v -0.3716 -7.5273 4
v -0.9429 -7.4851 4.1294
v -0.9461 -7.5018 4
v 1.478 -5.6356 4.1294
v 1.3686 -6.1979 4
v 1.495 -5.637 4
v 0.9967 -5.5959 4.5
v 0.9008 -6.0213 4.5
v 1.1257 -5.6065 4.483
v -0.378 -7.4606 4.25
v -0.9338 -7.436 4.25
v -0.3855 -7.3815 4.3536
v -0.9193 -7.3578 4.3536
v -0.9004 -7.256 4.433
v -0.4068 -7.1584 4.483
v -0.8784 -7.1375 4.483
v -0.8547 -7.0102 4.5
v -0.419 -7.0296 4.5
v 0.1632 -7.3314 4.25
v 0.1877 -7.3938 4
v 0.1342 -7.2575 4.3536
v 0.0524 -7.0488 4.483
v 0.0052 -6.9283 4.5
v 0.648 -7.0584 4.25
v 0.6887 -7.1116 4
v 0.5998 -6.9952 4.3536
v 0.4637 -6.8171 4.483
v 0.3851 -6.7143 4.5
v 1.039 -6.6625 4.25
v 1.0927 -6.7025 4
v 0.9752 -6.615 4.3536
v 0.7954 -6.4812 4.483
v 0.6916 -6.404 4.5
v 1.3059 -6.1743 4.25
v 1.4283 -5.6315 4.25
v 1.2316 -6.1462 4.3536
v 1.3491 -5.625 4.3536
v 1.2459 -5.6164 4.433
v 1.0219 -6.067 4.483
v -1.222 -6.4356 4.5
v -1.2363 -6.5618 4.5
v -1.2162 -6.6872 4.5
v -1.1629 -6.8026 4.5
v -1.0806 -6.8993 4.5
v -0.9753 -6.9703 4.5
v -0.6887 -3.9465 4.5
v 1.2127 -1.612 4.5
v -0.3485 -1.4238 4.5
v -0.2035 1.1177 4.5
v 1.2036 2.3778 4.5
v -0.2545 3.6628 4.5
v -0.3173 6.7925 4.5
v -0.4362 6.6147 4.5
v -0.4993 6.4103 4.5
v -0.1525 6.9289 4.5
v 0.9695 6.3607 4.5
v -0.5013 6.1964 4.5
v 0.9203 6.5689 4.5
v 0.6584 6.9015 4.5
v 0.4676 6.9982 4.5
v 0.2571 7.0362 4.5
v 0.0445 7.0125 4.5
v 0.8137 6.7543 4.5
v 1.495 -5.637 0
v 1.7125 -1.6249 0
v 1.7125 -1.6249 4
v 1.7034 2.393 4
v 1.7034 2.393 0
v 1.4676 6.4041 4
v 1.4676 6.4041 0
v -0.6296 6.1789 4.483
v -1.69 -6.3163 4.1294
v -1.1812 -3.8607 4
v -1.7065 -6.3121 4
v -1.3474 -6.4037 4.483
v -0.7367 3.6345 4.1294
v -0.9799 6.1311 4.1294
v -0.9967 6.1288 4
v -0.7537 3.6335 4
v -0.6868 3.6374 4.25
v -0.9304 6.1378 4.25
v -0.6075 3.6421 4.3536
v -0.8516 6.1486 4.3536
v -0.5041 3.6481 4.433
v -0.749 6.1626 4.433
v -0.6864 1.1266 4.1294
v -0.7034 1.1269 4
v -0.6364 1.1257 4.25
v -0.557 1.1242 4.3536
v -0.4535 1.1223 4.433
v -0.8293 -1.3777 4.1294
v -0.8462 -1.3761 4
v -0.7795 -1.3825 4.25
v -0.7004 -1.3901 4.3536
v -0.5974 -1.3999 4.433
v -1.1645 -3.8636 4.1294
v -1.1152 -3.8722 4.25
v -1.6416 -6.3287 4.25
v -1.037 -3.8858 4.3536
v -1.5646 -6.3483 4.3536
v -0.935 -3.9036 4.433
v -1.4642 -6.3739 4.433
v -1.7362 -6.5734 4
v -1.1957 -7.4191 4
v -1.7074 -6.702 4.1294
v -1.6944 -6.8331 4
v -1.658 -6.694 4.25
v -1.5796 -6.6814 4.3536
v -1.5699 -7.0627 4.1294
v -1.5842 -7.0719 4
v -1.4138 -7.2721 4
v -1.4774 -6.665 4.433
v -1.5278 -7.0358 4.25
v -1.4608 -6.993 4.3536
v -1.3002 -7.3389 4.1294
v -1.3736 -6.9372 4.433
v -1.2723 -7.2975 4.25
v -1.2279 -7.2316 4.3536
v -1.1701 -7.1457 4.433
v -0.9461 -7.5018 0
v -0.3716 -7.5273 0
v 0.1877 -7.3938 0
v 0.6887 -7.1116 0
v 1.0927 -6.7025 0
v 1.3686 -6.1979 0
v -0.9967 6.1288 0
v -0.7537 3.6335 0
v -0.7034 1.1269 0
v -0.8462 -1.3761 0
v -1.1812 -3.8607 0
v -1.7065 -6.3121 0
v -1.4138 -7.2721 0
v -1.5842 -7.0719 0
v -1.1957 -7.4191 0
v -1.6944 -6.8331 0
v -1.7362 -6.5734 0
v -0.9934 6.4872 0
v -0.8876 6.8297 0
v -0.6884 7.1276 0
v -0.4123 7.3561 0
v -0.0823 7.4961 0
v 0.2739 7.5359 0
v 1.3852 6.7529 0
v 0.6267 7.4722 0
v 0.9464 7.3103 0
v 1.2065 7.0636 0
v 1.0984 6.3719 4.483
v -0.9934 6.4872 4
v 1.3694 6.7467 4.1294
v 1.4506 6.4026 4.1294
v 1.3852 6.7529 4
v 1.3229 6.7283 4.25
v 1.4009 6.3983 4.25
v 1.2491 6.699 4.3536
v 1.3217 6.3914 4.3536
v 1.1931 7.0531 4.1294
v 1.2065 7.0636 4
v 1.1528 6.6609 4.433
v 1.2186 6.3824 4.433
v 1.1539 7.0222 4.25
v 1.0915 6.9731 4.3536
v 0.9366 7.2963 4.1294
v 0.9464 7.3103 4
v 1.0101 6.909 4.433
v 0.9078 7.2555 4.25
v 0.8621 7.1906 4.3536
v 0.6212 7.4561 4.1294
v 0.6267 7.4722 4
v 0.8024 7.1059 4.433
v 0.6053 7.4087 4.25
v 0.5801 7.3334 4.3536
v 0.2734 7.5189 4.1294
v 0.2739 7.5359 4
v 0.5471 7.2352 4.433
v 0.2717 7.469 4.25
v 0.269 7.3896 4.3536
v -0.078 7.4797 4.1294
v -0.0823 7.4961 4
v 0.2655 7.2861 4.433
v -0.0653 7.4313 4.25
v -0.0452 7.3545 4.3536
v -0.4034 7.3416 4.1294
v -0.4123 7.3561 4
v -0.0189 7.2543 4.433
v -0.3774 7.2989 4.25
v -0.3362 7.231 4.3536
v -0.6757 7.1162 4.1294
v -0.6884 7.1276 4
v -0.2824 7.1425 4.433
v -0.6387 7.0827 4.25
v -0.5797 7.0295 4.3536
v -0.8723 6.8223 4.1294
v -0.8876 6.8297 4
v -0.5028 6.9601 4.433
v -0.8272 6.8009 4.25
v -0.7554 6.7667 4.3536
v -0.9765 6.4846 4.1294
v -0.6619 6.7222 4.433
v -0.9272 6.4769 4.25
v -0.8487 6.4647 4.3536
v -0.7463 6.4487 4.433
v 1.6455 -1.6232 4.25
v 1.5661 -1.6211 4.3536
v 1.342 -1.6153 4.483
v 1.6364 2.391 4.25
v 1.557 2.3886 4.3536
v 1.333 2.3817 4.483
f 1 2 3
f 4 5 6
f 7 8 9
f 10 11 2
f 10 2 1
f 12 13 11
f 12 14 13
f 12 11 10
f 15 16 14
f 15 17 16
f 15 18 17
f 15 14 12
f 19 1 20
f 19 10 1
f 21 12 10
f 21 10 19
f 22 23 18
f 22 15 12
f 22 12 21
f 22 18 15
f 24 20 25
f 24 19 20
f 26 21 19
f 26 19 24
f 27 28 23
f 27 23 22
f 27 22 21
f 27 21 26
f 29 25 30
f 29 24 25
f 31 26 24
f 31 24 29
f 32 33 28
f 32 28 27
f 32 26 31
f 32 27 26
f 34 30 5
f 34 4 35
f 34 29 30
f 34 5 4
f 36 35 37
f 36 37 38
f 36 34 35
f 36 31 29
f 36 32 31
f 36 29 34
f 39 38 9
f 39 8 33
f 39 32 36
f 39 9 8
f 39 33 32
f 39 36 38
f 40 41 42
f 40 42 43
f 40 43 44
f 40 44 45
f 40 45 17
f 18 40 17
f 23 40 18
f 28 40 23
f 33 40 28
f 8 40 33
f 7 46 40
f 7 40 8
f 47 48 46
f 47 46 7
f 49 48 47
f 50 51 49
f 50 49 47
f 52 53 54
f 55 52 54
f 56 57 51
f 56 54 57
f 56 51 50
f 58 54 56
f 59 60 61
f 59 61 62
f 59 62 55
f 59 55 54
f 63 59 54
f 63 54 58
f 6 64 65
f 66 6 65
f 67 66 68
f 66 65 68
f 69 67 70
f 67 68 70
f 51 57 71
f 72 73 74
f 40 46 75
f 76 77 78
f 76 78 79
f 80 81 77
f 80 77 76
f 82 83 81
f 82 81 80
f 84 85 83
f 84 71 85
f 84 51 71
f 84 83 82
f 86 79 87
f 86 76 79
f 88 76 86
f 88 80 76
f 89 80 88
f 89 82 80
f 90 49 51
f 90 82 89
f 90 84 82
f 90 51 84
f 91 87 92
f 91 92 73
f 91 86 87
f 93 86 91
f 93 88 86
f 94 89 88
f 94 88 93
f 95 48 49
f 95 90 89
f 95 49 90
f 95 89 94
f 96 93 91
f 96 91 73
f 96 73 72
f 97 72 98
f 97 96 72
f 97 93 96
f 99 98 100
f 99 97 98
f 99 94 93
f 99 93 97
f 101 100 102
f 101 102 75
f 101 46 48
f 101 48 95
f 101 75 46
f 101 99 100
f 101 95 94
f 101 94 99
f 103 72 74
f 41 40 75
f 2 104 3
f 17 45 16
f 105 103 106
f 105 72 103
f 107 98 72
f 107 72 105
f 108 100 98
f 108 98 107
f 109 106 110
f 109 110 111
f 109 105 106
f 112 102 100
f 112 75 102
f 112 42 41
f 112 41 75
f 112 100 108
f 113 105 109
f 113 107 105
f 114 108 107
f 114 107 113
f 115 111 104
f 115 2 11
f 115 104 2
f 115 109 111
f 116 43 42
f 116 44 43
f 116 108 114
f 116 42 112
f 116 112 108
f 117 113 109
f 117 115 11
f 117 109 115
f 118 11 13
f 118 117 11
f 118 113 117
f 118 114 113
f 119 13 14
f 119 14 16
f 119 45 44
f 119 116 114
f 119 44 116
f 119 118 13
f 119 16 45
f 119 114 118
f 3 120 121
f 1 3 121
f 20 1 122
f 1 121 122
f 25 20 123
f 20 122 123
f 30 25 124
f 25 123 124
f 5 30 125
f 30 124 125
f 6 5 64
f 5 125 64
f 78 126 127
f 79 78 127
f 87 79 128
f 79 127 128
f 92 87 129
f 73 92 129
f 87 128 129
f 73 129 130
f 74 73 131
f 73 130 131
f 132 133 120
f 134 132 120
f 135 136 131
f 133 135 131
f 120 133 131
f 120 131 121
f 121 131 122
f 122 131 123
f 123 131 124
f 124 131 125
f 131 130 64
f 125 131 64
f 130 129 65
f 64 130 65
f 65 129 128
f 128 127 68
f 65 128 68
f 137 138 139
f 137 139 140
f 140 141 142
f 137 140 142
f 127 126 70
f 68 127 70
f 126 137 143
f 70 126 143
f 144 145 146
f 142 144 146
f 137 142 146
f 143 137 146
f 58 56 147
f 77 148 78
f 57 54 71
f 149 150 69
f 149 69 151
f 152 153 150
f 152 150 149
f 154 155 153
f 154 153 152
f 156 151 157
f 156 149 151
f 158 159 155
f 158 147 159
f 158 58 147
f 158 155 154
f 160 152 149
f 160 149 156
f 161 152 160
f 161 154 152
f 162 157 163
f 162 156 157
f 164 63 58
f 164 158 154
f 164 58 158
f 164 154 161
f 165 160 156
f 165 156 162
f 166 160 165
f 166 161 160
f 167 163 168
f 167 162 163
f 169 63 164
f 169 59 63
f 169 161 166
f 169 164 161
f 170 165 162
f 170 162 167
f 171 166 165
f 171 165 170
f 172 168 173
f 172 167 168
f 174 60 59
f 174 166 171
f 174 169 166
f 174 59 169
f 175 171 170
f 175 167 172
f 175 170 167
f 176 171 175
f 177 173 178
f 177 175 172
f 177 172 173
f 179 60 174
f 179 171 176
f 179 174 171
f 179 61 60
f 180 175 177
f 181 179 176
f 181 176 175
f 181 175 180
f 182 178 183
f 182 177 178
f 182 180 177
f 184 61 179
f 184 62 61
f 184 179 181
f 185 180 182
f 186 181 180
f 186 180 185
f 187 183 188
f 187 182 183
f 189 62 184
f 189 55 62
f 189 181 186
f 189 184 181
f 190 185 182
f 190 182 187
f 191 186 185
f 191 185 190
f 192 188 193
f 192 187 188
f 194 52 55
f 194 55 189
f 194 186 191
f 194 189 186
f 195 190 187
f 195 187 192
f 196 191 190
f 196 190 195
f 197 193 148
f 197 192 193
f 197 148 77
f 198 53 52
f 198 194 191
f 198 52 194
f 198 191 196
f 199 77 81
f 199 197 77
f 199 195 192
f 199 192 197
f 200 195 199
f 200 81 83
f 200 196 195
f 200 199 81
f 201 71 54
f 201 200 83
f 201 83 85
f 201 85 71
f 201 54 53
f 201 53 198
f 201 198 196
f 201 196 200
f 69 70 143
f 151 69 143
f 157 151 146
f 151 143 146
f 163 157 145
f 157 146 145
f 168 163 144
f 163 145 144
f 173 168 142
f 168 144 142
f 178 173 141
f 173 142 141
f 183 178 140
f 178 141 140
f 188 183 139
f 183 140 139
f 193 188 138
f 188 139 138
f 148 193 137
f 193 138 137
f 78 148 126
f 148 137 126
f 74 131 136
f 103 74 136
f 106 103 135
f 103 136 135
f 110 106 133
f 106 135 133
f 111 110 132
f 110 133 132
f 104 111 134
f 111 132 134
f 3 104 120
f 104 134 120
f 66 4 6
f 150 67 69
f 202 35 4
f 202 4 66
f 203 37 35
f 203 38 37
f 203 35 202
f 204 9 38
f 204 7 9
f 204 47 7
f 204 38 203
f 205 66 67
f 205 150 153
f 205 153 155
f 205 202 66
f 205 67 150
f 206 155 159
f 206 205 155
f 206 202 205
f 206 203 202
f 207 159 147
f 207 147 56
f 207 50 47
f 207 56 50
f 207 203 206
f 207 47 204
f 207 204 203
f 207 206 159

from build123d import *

# Parameters (mm, degrees)
EXTRUDE1_DEPTH = 4.5
FILLET1_R      = 0.5


with BuildPart() as part:
    # Sketch2 → Extrude1 (new body)
    with BuildSketch(Plane.XY):
        with BuildLine():
            ThreePointArc((1.467618759, 6.404104167), (0.094372819, 7.528980002), (-0.996737871, 6.128755907))
            ThreePointArc((-0.996737871, 6.128755907), (-0.750709422, -0.125968829), (-1.706502063, -6.312128537))
            ThreePointArc((-1.706502063, -6.312128537), (-1.584231252, -7.071852789), (-0.946059773, -7.501815872))
            ThreePointArc((-0.946059773, -7.501815872), (0.688671474, -7.111598822), (1.495022371, -5.637009447))
            ThreePointArc((1.495022371, -5.637009447), (1.73628539, 0.384127619), (1.467618759, 6.404104167))
        make_face()
    extrude(amount=EXTRUDE1_DEPTH)

    # Fillet1
    fillet1_edges = [part.edges().sort_by_distance(p)[0] for p in [
        (-0.750709422, -0.125968829, 4.5),
        (-1.584231252, -7.071852789, 4.5),
        (0.688671474, -7.111598822, 4.5),
        (1.73628539, 0.384127619, 4.5),
        (0.094372819, 7.528980002, 4.5),
    ]]
    fillet(fillet1_edges, radius=FILLET1_R)


solid = part.part
